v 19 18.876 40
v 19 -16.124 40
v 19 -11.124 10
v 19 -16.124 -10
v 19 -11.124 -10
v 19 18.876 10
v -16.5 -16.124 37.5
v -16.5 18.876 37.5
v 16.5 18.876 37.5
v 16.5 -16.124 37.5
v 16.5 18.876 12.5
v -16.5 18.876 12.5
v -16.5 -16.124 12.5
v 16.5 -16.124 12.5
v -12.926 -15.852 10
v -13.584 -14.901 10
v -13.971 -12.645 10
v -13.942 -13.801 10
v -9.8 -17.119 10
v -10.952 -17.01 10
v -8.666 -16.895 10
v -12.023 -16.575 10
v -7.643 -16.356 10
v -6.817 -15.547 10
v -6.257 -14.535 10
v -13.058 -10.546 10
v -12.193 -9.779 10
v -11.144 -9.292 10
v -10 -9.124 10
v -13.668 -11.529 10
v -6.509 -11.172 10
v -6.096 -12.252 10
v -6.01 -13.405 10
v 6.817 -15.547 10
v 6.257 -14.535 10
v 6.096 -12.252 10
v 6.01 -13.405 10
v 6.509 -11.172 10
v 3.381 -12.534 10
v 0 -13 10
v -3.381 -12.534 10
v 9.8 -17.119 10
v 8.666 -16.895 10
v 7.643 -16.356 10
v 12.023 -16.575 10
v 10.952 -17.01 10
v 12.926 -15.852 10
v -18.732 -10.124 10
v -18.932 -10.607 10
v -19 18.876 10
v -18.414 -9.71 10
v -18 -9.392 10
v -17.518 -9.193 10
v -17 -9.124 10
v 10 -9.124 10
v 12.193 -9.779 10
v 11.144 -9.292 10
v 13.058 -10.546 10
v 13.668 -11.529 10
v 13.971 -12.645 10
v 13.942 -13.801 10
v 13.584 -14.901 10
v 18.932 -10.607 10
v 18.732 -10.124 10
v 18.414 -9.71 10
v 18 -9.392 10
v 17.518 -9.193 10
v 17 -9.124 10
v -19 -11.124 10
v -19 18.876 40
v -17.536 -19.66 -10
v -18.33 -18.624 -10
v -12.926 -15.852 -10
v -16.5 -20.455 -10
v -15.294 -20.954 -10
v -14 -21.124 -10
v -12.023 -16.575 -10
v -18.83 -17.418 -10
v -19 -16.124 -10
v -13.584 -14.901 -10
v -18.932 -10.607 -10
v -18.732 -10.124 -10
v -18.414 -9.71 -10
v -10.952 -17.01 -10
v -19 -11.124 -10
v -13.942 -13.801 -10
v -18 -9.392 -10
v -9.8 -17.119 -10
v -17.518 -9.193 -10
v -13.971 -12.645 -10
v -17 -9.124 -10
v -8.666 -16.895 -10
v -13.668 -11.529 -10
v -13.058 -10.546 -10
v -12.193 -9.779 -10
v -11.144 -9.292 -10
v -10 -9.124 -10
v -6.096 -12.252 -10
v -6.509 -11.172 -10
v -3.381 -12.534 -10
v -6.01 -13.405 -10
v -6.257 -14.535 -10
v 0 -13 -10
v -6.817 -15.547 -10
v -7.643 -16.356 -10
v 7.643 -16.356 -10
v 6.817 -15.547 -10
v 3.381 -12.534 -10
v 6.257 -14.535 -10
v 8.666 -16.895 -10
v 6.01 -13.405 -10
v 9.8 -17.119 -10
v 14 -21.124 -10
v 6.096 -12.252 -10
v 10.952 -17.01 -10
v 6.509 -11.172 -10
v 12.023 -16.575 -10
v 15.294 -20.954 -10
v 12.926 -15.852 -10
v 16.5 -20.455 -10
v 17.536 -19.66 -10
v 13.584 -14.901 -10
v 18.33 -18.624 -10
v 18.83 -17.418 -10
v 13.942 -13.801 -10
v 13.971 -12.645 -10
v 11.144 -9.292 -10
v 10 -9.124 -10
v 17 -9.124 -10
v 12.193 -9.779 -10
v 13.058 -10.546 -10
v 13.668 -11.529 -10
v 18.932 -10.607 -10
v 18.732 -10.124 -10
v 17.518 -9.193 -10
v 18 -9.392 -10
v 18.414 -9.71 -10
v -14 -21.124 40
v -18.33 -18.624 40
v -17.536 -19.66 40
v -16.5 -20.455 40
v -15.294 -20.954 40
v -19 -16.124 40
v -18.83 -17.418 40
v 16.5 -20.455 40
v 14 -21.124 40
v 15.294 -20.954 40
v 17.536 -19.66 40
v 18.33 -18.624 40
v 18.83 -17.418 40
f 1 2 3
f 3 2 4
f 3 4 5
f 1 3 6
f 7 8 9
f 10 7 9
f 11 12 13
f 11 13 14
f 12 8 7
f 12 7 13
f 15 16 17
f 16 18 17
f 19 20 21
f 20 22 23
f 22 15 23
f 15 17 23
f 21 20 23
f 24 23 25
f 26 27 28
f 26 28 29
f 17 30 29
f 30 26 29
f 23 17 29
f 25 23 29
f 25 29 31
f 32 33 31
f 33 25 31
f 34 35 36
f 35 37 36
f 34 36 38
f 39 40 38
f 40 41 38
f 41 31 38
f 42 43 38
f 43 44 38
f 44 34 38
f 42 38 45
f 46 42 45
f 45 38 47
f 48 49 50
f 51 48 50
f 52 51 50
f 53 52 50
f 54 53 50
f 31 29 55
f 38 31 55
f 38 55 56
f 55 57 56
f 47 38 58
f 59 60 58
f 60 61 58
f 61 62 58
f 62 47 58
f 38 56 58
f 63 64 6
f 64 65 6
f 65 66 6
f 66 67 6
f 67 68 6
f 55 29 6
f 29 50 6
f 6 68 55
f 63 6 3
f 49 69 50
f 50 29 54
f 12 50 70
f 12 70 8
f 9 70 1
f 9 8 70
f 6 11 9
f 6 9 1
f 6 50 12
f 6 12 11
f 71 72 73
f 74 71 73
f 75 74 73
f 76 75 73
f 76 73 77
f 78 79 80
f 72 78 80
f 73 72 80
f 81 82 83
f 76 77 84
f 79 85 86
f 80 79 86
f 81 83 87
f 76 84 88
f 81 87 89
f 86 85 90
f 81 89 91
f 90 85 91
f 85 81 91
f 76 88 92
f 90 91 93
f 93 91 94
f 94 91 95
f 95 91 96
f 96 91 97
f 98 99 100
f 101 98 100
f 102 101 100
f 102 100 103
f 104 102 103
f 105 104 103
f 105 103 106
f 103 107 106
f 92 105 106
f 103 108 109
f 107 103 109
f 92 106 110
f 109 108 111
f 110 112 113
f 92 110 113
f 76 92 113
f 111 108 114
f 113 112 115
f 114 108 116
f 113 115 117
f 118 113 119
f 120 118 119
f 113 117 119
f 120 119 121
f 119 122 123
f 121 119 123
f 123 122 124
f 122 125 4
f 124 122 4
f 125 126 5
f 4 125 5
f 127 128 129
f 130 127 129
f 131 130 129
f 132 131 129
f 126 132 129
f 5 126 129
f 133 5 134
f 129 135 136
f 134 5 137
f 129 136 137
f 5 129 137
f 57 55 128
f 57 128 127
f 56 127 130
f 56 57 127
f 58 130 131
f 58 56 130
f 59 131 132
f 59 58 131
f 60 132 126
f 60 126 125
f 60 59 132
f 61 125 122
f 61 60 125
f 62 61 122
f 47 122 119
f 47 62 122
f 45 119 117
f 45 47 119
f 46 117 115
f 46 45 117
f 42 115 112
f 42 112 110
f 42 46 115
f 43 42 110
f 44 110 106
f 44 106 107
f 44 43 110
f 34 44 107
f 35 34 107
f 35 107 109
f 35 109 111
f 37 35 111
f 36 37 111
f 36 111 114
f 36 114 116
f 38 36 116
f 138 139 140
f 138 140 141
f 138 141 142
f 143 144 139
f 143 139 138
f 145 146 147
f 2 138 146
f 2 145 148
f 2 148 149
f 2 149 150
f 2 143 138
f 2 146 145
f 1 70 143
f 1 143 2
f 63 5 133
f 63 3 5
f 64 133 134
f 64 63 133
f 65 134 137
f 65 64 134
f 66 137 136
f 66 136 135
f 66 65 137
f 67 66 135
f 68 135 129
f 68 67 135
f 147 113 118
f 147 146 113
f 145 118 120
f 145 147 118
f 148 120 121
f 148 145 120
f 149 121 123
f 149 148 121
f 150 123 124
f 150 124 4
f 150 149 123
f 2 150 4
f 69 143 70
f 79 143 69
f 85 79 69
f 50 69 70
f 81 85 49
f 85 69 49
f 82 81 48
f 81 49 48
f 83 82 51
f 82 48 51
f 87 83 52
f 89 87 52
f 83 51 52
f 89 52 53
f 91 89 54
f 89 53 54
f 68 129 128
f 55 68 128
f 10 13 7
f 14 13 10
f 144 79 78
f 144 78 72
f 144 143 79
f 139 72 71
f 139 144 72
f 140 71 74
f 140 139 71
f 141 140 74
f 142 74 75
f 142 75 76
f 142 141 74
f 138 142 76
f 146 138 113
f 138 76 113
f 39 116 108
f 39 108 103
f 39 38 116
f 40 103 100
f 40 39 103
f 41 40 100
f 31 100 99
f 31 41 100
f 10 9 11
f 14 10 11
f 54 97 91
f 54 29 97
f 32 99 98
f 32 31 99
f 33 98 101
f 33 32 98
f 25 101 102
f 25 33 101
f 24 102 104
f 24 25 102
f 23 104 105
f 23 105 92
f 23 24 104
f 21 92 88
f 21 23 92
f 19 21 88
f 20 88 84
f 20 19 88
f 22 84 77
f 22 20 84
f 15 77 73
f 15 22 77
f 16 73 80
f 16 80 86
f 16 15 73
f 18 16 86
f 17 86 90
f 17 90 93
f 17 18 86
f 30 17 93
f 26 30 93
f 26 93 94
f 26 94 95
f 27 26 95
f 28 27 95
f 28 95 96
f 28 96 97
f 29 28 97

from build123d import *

# Parameters (mm, degrees)
BOSS_EXTRUDE1_DEPTH = 10
SKETCH2_W           = 38
SKETCH2_H           = 40
BOSS_EXTRUDE2_DEPTH = 30
FILLET1_R           = 5
FILLET2_R           = 2
SKETCH4_W           = 33
SKETCH4_H           = 25
CUT_EXTRUDE1_DEPTH  = 35


with BuildPart() as part:
    # Sketch1 → Boss-Extrude1 (new, symmetric)
    with BuildSketch(Plane.XY):
        with BuildLine():
            Line((-10, -9.124404748), (-19, -9.124404748))
            Line((-19, -9.124404748), (-19, -21.124404748))
            Line((-19, -21.124404748), (19, -21.124404748))
            Line((19, -21.124404748), (19, -9.124404748))
            Line((19, -9.124404748), (10, -9.124404748))
            ThreePointArc((10, -9.124404748), (12.023420987, -16.574878268), (6.509119733, -11.171520993))
            ThreePointArc((6.509119733, -11.171520993), (0, -13), (-6.509119733, -11.171520993))
            ThreePointArc((-6.509119733, -11.171520993), (-12.023420987, -16.574878268), (-10, -9.124404748))
        make_face()
    extrude(amount=BOSS_EXTRUDE1_DEPTH, both=True)

    # Sketch2 → Boss-Extrude2 (add)
    with BuildSketch(Plane.XY.offset(10)):
        with Locations((0, -1.124404748)):
            Rectangle(SKETCH2_W, SKETCH2_H)
    extrude(amount=BOSS_EXTRUDE2_DEPTH)

    # Fillet1
    fillet1_edges = [part.edges().sort_by_distance(p)[0] for p in [
        (19, -21.124404748, 15),
        (-19, -21.124404748, 15),
    ]]
    fillet(fillet1_edges, radius=FILLET1_R)

    # Fillet2
    fillet2_edges = [part.edges().sort_by_distance(p)[0] for p in [
        (19, -9.124404748, 0),
        (-19, -9.124404748, 0),
    ]]
    fillet(fillet2_edges, radius=FILLET2_R)

    # Sketch4 → Cut-Extrude1 (cut)
    with BuildSketch(Plane(origin=(0, 18.875595252, 0), x_dir=(1, 0, 0), z_dir=(0, 1, 0))):
        with Locations((0, -25)):
            Rectangle(SKETCH4_W, SKETCH4_H)
    extrude(amount=-CUT_EXTRUDE1_DEPTH, mode=Mode.SUBTRACT)


solid = part.part
